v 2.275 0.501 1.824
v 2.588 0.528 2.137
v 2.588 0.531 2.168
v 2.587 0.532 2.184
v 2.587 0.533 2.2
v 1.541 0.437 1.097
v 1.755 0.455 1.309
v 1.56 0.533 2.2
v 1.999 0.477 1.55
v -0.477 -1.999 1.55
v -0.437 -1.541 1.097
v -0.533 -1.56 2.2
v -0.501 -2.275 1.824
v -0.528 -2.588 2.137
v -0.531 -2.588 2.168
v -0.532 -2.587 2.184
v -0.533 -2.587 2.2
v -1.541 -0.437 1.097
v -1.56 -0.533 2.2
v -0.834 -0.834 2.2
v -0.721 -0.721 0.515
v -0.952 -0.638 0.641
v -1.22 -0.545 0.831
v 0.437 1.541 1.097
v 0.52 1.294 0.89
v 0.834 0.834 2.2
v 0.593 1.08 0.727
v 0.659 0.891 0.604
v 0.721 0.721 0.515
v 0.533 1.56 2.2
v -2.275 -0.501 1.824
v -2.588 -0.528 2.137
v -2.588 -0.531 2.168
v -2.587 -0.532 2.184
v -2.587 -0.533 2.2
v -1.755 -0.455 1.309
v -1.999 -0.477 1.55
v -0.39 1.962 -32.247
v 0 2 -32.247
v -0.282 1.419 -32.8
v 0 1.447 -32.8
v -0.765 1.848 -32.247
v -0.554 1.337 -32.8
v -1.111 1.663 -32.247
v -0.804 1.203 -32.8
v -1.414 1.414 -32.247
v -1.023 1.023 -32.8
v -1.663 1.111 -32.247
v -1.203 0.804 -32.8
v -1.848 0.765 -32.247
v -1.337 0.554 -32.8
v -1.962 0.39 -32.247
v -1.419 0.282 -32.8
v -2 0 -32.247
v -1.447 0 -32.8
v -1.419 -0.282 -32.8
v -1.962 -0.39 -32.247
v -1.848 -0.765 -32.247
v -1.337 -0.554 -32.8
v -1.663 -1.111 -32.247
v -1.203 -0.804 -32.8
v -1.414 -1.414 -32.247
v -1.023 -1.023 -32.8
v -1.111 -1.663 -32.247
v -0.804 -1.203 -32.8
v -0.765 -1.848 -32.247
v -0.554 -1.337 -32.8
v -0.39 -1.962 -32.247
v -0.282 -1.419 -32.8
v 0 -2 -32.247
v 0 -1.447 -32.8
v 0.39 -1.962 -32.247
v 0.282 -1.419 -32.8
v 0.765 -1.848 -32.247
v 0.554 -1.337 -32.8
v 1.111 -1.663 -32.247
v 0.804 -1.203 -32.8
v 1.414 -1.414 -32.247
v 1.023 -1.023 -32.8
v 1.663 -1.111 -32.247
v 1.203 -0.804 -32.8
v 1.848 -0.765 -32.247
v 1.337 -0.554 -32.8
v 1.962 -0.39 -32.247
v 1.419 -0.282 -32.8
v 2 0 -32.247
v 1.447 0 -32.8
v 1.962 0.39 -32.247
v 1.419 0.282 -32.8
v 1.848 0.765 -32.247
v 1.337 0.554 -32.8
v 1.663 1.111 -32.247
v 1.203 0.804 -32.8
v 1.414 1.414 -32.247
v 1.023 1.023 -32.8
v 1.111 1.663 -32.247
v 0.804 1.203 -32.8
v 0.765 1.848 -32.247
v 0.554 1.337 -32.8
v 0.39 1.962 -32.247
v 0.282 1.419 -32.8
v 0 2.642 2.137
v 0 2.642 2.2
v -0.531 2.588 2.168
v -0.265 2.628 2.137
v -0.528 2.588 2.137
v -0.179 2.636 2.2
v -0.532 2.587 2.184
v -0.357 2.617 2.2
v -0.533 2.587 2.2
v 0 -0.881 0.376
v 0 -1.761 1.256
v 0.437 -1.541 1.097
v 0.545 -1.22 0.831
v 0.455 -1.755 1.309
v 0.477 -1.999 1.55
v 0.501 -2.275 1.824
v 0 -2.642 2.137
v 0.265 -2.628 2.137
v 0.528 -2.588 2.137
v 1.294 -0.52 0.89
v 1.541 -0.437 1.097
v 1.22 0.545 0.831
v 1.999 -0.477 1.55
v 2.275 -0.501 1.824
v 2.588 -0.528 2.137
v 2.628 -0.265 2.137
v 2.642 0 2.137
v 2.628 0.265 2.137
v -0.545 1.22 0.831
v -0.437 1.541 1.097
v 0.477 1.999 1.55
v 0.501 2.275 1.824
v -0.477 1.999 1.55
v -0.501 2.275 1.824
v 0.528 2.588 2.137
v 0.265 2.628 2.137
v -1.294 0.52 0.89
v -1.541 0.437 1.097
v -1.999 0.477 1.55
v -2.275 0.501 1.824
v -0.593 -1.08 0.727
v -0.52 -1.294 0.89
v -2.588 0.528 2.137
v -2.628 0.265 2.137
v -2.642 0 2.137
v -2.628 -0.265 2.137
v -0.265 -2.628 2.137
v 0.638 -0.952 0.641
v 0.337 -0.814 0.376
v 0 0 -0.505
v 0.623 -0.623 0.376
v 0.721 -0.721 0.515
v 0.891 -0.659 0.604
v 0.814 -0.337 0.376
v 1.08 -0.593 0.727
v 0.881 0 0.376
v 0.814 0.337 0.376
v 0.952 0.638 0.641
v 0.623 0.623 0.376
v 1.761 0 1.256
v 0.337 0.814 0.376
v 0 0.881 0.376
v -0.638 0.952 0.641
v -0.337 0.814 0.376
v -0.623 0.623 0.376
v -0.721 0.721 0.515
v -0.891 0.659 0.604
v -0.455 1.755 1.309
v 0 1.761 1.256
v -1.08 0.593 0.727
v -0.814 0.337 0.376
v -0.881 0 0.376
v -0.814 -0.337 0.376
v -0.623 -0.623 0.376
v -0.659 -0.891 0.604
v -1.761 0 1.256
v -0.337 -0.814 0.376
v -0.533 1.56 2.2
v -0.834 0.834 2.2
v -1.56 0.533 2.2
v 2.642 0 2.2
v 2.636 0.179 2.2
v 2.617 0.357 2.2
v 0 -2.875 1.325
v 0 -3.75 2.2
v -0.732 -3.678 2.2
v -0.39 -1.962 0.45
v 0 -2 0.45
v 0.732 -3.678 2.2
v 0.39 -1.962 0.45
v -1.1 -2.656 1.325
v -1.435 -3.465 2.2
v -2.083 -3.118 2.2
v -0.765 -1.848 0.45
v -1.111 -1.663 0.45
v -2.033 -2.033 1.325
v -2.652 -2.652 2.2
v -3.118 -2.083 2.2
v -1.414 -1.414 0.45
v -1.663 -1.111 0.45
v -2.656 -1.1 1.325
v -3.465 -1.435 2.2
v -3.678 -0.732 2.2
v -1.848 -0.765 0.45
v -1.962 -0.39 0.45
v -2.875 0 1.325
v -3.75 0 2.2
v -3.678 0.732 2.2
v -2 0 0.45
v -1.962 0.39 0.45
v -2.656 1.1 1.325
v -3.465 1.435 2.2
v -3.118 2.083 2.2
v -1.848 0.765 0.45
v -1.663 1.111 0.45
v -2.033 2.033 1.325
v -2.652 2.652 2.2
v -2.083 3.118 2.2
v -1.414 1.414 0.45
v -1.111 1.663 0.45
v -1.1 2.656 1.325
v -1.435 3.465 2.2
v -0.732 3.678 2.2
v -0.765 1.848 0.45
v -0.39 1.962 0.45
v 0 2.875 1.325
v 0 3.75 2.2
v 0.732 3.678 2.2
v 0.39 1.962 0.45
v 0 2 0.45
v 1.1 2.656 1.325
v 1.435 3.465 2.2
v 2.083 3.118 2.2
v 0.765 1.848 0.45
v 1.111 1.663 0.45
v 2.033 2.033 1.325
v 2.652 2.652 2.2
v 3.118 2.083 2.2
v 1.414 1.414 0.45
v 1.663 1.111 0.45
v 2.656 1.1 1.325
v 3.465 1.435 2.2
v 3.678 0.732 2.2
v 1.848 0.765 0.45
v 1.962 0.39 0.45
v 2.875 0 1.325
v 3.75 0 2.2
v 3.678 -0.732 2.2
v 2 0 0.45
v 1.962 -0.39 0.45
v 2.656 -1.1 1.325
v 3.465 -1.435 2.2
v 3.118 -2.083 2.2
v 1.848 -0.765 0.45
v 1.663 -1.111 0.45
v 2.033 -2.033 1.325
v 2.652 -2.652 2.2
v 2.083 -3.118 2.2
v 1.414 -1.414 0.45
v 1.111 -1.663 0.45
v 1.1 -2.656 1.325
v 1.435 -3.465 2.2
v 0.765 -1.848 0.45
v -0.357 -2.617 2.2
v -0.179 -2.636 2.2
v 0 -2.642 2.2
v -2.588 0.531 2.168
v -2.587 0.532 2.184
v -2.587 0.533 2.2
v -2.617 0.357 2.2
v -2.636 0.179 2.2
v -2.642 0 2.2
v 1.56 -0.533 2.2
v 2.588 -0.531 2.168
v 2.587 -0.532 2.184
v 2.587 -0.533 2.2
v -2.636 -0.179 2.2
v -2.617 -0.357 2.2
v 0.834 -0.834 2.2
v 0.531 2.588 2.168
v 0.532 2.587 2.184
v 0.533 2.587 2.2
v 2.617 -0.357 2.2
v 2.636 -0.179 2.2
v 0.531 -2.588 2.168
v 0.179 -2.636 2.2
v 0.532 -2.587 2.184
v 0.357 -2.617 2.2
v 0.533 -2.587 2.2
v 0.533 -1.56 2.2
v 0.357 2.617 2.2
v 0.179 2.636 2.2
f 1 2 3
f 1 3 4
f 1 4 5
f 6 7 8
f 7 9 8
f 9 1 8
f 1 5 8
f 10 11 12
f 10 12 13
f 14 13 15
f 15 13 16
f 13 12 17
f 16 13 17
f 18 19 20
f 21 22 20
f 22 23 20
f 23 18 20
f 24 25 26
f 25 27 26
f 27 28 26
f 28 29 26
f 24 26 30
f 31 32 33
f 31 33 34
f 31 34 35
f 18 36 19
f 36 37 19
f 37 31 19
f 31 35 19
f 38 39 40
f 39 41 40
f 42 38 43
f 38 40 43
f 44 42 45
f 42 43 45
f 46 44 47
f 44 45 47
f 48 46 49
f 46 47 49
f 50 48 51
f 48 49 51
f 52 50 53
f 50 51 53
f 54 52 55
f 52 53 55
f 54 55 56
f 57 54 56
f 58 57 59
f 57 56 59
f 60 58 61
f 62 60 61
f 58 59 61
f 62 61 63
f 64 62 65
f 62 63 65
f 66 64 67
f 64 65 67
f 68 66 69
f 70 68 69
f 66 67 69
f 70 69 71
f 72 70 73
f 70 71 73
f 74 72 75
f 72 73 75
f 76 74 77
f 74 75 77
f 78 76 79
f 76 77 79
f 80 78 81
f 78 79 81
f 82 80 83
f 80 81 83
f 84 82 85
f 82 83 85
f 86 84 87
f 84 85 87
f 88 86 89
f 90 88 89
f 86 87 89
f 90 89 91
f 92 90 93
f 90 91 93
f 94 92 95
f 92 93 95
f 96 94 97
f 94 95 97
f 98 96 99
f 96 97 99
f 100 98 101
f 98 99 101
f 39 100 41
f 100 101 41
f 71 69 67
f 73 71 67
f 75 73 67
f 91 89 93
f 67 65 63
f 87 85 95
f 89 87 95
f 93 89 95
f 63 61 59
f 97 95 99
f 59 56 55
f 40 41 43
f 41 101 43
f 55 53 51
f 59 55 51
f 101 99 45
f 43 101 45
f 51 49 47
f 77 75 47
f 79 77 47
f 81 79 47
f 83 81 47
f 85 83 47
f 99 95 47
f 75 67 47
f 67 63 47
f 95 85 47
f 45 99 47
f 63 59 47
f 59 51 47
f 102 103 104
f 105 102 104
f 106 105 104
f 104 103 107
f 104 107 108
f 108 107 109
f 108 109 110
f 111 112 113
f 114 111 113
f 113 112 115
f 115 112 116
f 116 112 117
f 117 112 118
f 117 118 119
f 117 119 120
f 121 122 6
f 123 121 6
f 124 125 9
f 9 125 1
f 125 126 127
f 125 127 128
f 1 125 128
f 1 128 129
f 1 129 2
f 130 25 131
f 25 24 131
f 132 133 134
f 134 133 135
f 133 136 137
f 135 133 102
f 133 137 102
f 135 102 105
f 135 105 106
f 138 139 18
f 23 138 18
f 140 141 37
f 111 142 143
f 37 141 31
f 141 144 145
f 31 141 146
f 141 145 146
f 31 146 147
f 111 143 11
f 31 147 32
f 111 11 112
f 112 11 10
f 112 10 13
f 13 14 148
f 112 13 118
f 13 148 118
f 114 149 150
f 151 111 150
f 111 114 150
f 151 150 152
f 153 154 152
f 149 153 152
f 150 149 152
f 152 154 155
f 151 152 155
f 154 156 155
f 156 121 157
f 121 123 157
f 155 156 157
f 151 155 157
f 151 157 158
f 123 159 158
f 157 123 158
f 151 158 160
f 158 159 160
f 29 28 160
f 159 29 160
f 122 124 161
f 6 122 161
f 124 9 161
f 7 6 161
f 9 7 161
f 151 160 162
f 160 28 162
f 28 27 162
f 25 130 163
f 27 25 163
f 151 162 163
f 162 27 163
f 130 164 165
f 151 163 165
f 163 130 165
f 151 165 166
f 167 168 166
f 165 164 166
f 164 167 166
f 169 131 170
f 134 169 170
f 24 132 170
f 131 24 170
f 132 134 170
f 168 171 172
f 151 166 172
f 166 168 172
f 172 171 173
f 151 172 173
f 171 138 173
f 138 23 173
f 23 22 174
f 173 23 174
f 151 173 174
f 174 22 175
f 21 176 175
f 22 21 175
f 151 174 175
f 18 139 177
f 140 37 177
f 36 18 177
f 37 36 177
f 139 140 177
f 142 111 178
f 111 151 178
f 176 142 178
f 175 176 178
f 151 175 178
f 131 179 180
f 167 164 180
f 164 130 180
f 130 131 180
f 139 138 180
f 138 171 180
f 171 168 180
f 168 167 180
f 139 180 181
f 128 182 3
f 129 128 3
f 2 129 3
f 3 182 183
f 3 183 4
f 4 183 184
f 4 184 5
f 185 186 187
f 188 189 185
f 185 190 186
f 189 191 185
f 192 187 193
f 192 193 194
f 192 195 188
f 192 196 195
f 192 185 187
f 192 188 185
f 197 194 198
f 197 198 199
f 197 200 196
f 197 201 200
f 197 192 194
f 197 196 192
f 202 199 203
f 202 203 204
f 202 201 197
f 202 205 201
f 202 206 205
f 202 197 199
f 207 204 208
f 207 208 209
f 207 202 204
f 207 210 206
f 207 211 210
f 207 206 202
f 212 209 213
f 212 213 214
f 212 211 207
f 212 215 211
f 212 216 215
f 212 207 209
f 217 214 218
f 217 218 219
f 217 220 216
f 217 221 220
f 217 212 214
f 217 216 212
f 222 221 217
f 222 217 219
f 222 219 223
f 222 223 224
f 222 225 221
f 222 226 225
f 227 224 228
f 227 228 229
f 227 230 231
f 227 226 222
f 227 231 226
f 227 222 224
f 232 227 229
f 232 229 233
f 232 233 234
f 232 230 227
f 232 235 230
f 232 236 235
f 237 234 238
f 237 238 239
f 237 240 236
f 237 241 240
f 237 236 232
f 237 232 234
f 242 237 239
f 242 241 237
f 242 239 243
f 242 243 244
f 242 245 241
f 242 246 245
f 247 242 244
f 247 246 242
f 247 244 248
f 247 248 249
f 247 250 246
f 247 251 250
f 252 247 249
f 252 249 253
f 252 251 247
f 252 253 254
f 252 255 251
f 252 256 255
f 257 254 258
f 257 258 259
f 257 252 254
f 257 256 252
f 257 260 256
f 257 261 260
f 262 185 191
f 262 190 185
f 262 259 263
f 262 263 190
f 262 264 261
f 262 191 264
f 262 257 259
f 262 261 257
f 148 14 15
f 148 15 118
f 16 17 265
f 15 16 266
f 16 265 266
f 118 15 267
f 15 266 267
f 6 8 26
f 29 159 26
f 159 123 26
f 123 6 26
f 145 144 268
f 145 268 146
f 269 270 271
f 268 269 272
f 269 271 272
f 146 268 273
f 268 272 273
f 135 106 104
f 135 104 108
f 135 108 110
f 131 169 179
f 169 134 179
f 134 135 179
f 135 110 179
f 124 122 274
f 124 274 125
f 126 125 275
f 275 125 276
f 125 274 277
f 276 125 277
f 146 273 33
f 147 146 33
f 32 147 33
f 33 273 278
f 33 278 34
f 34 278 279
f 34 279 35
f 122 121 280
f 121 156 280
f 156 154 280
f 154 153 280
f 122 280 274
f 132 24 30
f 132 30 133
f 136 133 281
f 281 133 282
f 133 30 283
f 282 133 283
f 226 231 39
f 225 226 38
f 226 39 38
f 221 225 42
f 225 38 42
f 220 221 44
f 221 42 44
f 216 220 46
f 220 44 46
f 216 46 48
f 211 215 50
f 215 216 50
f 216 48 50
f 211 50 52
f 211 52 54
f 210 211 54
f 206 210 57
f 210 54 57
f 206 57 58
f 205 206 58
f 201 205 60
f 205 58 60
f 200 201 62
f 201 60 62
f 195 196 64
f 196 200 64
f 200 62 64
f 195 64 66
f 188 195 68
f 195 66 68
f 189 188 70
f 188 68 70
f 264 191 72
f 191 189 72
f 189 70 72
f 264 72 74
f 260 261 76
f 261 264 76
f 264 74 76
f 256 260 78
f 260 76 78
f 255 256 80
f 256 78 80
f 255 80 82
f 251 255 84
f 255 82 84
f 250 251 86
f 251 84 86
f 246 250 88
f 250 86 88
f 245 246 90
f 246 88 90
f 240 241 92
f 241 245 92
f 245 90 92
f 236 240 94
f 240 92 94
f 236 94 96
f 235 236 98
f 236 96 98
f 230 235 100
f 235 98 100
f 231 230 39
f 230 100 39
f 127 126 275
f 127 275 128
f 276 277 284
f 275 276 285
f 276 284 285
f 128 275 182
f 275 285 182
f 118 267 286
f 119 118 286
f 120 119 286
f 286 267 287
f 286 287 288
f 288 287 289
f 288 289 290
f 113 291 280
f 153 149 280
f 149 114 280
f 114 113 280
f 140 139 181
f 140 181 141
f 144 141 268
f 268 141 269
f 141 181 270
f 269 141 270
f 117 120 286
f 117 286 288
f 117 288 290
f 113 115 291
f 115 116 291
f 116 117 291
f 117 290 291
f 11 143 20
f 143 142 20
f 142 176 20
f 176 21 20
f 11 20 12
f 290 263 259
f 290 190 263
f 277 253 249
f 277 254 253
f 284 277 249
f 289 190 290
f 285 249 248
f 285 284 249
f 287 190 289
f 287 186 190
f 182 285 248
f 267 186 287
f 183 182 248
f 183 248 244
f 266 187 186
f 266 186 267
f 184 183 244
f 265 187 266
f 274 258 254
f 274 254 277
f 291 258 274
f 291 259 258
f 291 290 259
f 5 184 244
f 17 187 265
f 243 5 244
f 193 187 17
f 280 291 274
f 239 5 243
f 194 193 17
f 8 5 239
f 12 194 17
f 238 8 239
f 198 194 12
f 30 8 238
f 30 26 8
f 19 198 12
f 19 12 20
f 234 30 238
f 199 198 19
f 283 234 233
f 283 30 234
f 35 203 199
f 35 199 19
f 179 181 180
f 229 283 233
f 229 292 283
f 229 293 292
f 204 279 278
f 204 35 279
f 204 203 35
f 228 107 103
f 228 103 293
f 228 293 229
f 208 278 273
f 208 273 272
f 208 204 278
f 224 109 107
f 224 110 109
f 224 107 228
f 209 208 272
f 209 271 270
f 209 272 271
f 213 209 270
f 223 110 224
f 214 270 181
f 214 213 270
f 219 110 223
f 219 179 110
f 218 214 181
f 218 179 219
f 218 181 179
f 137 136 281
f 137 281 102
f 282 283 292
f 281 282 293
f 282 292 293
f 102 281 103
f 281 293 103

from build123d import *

# Parameters (mm, degrees)
CUT_EXTRUDE1_REACH = 37.4
CIRPATTERN1_COUNT  = 4
DRAFT2_ANGLE       = 5


with BuildPart() as part:
    # Sketch3 → Revolve1 (revolve)
    with BuildSketch(Plane(origin=(0, 0, 0), x_dir=(0, 0, -1), z_dir=(1, 0, 0)), mode=Mode.PRIVATE) as revolve1_sk:
        Polygon((-2.2, 0), (-2.2, 3.75), (-0.45, 2), (-0.45, 0), align=None)
    revolve(revolve1_sk.sketch.rotate(Axis((0, 0, 2.2), (0, 0, -1)), 180), axis=Axis((0, 0, 2.2), (0, 0, -1)))

    # Sketch5 → Revolve2 (revolve)
    with BuildSketch(Plane(origin=(0, 0, 0), x_dir=(0, 0, -1), z_dir=(1, 0, 0))):
        Polygon((32.8, 0), (-0.45, 0), (-0.45, 2), (32.247, 2), (32.8, 1.447), align=None)
    revolve(axis=Axis((0, 0, -32.8), (0, 0, 1)))

    # Cut-Extrude1: up to this cone (the profile starts inside it)
    cut_extrude1_end = Plane(origin=(0, 0, 2.2), z_dir=(0, 0, 1)).offset(-2.704989458) * Cone(1e-06, 43.309980917, 43.309979917, align=(Align.CENTER, Align.CENTER, Align.MIN), mode=Mode.PRIVATE)
    # Sketch4 → Cut-Extrude1 (cut, up to the surface)
    with BuildSketch(Plane.XY.offset(2.2), mode=Mode.PRIVATE) as cut_extrude1_sk1:
        with BuildLine():
            Line((0, 0), (2.6416, 0))
            ThreePointArc((2.6416, 0), (2.627961466, 0.268084114), (2.587186696, 0.5334))
            Line((2.587186696, 0.5334), (1.560293348, 0.5334))
            Line((1.560293348, 0.5334), (0.834170098, 0.834170098))
            Line((0.834170098, 0.834170098), (0.5334, 1.560293348))
            Line((0.5334, 1.560293348), (0.5334, 2.587186696))
            ThreePointArc((0.5334, 2.587186696), (0.268084114, 2.627961466), (0, 2.6416))
            Line((0, 2.6416), (0, 0))
        make_face()
    cut_extrude1_tool1 = extrude(cut_extrude1_sk1.sketch, amount=-CUT_EXTRUDE1_REACH, mode=Mode.PRIVATE) & cut_extrude1_end
    cut_extrude1 = cut_extrude1_tool1.solids().sort_by_distance((0.037358, 1.3208, 2.2))[0]
    add(cut_extrude1, mode=Mode.SUBTRACT)

    # CirPattern1: Cut-Extrude1 ×4 about axis
    cirpattern1_axis = Axis((0, 0, 0), (0, 0, 1))
    for i in range(1, CIRPATTERN1_COUNT):
        add(cut_extrude1.rotate(cirpattern1_axis, i * 360 / CIRPATTERN1_COUNT), mode=Mode.SUBTRACT)

    # Draft2
    draft2_faces = [part.faces().sort_by_distance(p)[0] for p in [
        (-1.92259155, 0.5334, 1.845671202),
        (-1.175407967, 0.692824745, 1.535600175),
        (-0.692824745, 1.175407967, 1.535600175),
        (-0.5334, 1.92259155, 1.845671202),
        (0.5334, 1.92259155, 1.845671202),
        (0.692824745, 1.175407967, 1.535600175),
        (1.175407967, 0.692824745, 1.535600175),
        (1.92259155, 0.5334, 1.845671202),
        (1.92259155, -0.5334, 1.845671202),
        (1.175407967, -0.692824745, 1.535600175),
        (0.692824745, -1.175407967, 1.535600175),
        (0.5334, -1.92259155, 1.845671202),
        (-0.5334, -1.92259155, 1.845671202),
        (-0.692824745, -1.175407967, 1.535600175),
        (-1.175407967, -0.692824745, 1.535600175),
        (-1.92259155, -0.5334, 1.845671202),
    ]]
    draft(draft2_faces, Plane(origin=(0, 0, 2.2), x_dir=(0, 1, 0), z_dir=(0, 0, 1)), DRAFT2_ANGLE)


solid = part.part
